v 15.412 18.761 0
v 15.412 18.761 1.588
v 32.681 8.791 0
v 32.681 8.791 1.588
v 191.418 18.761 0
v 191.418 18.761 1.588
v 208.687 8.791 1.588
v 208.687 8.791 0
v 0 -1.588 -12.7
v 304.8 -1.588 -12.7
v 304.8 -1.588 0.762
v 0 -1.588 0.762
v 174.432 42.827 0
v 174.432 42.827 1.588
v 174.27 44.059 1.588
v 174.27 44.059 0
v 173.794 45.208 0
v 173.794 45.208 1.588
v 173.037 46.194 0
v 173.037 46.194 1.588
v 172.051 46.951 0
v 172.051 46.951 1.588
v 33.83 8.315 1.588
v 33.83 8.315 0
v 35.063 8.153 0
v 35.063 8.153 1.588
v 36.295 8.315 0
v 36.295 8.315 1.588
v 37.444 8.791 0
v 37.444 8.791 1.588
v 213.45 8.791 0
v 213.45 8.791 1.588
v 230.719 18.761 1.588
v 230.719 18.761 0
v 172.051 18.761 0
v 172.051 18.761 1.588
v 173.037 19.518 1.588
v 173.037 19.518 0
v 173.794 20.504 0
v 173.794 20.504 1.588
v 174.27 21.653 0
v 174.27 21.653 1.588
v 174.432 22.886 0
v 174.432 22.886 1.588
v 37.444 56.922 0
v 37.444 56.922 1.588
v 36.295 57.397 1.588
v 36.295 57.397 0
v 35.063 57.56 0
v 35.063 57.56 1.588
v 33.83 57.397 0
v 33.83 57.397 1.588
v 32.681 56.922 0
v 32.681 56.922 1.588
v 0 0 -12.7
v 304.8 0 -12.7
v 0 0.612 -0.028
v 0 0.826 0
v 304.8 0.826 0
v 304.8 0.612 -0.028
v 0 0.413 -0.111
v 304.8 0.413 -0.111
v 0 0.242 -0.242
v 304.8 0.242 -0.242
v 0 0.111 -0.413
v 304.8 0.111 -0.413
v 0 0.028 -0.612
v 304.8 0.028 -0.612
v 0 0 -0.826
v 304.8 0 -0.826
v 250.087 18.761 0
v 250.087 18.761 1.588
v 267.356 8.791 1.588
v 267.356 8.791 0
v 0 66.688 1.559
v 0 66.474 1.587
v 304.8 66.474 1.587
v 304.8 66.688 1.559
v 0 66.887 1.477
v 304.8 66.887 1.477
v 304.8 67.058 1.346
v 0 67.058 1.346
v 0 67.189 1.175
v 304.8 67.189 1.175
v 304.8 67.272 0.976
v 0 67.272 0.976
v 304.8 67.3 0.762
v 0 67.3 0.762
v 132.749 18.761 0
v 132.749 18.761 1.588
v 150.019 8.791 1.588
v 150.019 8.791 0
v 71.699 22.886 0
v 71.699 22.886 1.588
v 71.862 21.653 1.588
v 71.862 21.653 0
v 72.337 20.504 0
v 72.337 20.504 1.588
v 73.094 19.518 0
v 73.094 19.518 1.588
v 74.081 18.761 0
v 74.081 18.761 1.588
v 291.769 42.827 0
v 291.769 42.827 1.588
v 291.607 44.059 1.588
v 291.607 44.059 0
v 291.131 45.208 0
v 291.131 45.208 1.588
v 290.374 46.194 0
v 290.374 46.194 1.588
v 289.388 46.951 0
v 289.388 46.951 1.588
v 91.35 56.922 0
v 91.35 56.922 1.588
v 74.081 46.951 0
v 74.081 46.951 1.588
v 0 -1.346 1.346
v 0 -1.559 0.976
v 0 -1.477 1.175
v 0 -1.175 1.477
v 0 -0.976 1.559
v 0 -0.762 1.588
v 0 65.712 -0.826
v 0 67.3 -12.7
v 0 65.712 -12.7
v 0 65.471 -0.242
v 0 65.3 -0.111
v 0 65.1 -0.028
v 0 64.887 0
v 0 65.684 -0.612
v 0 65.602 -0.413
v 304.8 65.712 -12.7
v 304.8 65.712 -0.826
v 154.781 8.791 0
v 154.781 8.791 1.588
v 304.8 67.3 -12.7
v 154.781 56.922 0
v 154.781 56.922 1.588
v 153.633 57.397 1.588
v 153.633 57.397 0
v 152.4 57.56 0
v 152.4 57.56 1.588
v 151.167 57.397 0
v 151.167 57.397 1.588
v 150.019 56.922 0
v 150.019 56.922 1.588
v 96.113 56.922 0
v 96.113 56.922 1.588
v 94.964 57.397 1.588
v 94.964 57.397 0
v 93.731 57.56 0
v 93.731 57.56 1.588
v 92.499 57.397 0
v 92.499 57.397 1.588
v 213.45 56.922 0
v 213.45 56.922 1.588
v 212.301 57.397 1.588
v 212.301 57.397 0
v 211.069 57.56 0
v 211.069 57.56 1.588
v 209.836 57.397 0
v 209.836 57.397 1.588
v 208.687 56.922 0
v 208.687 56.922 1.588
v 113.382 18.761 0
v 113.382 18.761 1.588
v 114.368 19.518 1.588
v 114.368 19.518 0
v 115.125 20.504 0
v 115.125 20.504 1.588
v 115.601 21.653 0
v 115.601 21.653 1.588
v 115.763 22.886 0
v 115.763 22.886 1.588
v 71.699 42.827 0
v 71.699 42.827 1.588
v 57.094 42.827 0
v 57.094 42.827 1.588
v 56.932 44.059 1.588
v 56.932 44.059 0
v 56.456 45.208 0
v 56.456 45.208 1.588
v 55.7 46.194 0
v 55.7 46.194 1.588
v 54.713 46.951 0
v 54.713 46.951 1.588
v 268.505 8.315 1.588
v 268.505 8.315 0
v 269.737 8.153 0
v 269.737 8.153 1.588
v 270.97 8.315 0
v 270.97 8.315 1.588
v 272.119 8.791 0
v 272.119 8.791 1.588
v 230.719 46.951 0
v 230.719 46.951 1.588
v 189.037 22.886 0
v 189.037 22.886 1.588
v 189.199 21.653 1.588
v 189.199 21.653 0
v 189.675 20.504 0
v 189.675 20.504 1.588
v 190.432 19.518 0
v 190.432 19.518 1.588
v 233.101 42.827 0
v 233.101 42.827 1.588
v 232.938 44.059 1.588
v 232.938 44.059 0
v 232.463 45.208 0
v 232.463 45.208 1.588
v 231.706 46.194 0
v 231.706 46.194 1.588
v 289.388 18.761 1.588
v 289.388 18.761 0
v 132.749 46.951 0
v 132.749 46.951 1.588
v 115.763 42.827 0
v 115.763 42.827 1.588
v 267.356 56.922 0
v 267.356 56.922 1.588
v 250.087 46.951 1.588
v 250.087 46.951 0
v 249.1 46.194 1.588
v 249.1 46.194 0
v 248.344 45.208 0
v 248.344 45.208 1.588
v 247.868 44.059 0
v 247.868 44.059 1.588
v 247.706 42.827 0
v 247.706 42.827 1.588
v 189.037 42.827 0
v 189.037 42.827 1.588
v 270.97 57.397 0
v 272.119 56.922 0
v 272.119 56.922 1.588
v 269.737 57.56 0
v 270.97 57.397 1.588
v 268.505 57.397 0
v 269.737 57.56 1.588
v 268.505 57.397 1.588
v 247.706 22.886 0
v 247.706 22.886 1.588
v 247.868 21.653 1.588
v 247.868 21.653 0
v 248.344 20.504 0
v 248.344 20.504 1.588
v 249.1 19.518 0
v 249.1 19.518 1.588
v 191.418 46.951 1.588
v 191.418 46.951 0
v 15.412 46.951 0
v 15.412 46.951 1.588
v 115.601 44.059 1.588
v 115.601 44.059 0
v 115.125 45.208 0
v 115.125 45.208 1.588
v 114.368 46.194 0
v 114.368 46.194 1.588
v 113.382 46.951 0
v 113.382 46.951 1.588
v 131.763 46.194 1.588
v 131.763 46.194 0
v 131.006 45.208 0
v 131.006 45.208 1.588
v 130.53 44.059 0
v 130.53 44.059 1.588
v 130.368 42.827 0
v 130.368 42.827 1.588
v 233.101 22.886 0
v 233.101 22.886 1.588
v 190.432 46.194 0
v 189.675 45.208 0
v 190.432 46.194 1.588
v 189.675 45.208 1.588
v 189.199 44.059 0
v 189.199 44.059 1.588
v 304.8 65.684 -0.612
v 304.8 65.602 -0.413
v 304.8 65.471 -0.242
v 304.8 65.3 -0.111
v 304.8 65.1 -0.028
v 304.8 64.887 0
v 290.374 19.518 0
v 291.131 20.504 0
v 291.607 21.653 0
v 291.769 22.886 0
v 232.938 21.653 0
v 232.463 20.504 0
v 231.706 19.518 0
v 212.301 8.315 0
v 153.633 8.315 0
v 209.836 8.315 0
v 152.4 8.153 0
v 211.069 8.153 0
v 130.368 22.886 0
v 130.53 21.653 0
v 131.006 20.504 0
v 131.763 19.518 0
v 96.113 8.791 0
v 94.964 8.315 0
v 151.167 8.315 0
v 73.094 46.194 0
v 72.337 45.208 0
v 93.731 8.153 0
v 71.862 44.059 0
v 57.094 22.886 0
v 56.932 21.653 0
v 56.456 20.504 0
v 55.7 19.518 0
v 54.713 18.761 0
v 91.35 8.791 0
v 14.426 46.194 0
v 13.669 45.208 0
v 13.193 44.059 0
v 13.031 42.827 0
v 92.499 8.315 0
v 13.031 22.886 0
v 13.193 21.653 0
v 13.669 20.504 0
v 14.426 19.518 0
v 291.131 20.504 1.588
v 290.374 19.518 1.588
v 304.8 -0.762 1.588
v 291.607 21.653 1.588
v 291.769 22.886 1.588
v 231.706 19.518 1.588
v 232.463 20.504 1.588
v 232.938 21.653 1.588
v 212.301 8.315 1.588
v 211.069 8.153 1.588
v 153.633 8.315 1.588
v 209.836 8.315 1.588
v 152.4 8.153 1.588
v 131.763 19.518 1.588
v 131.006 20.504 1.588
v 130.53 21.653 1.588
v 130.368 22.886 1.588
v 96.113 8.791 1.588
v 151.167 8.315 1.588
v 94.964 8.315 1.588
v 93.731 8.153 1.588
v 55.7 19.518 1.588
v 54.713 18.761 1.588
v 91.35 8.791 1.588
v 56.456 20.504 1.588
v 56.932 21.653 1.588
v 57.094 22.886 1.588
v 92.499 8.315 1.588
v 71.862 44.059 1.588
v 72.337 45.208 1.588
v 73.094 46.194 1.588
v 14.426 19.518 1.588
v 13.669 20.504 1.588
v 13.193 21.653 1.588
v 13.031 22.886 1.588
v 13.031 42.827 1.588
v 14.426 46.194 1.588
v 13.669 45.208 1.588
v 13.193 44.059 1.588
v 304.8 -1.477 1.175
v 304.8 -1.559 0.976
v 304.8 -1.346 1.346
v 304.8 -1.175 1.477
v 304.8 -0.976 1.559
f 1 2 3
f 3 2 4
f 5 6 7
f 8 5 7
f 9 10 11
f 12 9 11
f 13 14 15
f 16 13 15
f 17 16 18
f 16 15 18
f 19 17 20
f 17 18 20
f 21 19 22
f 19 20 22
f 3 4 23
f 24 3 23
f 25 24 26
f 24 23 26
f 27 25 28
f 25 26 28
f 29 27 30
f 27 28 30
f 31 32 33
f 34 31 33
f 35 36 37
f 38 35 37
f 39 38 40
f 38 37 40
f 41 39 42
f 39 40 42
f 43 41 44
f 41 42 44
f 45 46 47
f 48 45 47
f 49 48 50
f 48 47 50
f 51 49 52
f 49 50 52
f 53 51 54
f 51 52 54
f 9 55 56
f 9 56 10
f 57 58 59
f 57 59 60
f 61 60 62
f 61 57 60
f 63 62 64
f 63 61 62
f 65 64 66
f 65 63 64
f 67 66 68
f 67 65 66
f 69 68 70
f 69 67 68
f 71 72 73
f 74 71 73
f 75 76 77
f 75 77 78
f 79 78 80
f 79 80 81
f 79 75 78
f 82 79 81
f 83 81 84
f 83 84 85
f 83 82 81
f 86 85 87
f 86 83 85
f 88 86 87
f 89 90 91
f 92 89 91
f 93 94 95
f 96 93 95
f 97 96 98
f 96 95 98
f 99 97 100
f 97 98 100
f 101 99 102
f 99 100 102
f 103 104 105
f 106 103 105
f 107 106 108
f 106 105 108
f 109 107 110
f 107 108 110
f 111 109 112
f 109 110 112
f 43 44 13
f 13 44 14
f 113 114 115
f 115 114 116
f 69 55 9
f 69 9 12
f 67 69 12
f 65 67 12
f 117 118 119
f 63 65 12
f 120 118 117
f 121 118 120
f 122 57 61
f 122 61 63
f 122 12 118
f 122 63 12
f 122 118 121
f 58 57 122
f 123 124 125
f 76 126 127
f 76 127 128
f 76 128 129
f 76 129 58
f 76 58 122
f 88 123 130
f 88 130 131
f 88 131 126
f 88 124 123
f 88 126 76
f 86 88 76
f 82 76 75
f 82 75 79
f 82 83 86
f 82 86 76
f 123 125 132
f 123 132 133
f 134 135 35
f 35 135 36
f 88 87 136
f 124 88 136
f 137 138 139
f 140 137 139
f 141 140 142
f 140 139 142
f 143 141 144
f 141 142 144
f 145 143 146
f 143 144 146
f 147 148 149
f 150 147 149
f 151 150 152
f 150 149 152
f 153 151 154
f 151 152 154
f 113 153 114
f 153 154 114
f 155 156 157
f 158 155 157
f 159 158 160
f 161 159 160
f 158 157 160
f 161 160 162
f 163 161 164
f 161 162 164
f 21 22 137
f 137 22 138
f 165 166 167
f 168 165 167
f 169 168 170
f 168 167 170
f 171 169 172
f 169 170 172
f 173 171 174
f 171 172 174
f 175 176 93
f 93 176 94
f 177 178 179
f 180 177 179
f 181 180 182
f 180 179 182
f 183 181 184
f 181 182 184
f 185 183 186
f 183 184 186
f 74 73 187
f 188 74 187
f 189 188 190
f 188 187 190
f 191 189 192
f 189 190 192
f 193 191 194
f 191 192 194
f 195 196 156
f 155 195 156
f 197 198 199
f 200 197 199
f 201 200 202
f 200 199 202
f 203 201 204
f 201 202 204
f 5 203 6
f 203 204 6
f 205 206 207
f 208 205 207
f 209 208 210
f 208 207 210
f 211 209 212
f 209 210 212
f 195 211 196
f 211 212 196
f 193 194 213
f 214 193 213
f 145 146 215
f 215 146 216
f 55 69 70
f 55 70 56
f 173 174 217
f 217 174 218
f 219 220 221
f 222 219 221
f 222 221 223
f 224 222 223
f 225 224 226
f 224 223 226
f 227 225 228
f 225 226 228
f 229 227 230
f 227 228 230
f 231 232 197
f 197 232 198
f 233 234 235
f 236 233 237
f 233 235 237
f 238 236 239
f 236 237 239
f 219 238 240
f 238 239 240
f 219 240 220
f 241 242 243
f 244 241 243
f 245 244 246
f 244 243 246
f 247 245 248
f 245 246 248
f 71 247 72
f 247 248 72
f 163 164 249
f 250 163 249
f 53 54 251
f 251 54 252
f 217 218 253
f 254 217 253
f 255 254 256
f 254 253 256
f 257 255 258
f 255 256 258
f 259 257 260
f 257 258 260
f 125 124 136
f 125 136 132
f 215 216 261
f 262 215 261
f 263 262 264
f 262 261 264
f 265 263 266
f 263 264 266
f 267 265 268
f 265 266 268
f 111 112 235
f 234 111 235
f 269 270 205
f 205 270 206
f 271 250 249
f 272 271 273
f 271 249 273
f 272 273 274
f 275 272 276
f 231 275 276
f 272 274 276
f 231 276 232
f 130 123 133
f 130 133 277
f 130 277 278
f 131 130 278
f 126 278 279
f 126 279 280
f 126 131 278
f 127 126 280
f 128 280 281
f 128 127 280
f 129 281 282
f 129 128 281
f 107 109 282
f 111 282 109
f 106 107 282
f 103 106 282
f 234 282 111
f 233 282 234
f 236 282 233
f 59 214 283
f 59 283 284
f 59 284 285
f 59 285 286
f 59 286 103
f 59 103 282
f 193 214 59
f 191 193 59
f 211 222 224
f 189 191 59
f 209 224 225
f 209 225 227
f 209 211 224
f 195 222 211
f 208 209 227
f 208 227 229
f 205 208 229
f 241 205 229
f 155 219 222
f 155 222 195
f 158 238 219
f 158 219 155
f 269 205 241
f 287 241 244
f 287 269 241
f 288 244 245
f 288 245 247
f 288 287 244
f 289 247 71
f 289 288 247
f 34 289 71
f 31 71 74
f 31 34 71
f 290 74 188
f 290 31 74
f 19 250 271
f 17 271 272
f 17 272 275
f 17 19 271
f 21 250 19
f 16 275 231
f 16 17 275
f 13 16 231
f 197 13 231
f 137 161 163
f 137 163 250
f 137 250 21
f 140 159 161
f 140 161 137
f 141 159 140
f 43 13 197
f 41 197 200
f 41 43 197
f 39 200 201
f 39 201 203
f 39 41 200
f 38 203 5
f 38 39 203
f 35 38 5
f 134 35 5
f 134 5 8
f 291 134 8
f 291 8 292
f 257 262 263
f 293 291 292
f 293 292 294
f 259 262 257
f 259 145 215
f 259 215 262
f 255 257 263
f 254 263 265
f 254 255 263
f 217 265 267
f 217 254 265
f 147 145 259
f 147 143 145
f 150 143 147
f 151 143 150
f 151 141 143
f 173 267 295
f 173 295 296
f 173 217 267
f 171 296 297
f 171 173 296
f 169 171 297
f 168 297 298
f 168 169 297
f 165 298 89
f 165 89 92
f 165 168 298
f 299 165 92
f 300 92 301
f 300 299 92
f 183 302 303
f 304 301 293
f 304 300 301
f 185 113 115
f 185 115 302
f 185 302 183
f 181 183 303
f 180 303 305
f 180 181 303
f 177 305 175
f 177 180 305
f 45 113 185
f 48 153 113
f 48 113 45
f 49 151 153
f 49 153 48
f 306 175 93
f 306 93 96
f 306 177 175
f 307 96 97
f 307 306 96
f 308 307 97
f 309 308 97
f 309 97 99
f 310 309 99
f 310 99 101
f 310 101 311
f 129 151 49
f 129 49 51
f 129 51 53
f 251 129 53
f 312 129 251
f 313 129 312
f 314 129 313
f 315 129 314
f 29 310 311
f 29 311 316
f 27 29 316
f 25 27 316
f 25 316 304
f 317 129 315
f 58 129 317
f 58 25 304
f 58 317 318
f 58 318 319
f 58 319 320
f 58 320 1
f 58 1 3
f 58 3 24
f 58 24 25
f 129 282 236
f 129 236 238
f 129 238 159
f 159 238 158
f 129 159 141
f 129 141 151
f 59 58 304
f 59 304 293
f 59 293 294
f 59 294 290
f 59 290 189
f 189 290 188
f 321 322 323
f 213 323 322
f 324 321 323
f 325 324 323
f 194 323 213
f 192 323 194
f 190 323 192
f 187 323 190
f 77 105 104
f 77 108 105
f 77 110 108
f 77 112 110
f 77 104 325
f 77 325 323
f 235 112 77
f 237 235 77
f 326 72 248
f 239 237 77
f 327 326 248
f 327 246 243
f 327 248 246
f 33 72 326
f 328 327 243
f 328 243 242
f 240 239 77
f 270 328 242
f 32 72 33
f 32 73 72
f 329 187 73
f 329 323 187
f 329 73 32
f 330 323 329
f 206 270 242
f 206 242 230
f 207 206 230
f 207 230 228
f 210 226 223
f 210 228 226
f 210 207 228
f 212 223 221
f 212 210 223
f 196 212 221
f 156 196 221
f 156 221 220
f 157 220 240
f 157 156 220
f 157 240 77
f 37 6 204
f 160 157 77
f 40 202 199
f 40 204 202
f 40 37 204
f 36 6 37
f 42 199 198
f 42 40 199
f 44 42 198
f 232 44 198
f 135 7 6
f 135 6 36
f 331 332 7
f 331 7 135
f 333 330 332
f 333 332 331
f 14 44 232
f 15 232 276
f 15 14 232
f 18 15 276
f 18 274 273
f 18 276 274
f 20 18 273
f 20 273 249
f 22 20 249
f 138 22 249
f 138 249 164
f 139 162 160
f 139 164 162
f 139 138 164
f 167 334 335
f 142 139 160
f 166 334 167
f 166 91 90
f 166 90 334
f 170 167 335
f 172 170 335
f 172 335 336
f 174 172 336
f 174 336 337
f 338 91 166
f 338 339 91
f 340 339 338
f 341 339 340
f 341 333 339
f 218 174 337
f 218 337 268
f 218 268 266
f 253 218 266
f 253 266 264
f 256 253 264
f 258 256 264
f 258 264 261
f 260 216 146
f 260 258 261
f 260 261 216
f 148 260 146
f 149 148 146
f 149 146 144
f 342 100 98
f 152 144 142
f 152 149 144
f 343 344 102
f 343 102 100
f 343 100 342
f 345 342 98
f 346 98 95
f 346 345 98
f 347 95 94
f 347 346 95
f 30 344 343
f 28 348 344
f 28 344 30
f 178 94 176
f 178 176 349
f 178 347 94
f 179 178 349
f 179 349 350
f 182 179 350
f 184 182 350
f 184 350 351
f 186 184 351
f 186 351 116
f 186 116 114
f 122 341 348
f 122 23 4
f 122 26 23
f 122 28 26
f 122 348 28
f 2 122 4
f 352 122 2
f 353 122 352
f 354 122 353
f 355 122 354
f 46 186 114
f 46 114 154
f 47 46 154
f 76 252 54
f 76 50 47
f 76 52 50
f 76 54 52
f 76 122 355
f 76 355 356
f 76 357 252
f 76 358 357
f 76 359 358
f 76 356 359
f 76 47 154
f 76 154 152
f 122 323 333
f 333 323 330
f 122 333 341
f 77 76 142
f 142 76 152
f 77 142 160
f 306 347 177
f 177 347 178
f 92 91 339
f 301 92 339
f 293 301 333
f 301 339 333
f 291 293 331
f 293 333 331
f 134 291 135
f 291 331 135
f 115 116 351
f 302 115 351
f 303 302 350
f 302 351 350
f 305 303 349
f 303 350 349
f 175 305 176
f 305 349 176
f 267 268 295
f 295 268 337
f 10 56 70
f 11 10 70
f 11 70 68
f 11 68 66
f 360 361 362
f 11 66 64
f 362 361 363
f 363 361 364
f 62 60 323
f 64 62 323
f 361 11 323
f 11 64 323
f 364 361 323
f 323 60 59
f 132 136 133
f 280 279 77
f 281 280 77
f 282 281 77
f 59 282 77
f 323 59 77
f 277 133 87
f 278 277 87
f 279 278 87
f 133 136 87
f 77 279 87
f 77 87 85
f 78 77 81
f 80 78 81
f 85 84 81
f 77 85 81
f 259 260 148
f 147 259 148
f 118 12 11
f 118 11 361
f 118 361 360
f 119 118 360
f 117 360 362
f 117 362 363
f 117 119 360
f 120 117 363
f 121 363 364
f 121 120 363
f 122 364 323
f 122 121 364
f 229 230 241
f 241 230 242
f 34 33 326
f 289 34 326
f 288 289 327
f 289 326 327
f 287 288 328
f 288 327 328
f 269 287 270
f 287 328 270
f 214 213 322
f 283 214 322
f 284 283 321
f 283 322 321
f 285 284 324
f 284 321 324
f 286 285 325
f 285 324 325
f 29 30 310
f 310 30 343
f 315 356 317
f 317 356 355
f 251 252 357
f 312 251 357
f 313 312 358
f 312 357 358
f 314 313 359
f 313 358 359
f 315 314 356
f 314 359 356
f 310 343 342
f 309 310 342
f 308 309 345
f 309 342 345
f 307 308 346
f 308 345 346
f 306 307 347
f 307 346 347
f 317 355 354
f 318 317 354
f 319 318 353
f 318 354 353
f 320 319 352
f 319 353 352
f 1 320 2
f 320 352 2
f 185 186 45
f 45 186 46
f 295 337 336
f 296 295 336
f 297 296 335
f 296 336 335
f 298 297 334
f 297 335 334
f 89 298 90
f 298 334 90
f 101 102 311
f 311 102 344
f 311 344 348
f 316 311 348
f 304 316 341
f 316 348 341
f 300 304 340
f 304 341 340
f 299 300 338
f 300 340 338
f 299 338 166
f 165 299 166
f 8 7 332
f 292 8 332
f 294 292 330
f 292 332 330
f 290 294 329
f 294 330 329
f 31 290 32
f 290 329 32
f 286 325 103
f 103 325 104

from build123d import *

# Parameters (mm, degrees)
BOSS_EXTRUDE1_DEPTH = 304.8
CUT_EXTRUDE1_REACH  = 16.288


with BuildPart() as part:
    # Sketch1 → Boss-Extrude1 (new body)
    with BuildSketch(Plane(origin=(0, 0, 0), x_dir=(0, 0, -1), z_dir=(1, 0, 0))):
        with BuildLine():
            Line((-0.762, 67.29984), (12.7, 67.29984))
            Line((12.7, 67.29984), (12.7, 65.71234))
            Line((12.7, 65.71234), (0.8255, 65.71234))
            ThreePointArc((0.8255, 65.71234), (0.241783352, 65.470556648), (0, 64.88684))
            Line((0, 64.88684), (0, 0.8255))
            ThreePointArc((0, 0.8255), (0.241783352, 0.241783352), (0.8255, 0))
            Line((0.8255, 0), (12.7, 0))
            Line((12.7, 0), (12.7, -1.5875))
            Line((12.7, -1.5875), (-0.762, -1.5875))
            ThreePointArc((-0.762, -1.5875), (-1.345716648, -1.345716648), (-1.5875, -0.762))
            Line((-1.5875, -0.762), (-1.5875, 66.47434))
            ThreePointArc((-1.5875, 66.47434), (-1.345716648, 67.058056648), (-0.762, 67.29984))
        make_face()
    extrude(amount=BOSS_EXTRUDE1_DEPTH)

    # Sketch2 → Cut-Extrude1 (cut, up to next)
    with BuildSketch(Plane.XY.offset(1.5875), mode=Mode.PRIVATE) as cut_extrude1_sk1:
        with BuildLine():
            Line((32.681340962, 56.921546337), (15.411988703, 46.951081161))
            ThreePointArc((15.411988703, 46.951081161), (13.668792717, 45.207885176), (13.030738703, 42.826635176))
            Line((13.030738703, 42.826635176), (13.030738703, 22.885704824))
            ThreePointArc((13.030738703, 22.885704824), (13.668792717, 20.504454824), (15.411988703, 18.761258839))
            Line((15.411988703, 18.761258839), (32.681340962, 8.790793663))
            ThreePointArc((32.681340962, 8.790793663), (35.062590962, 8.152739649), (37.443840962, 8.790793663))
            Line((37.443840962, 8.790793663), (54.713193222, 18.761258839))
            ThreePointArc((54.713193222, 18.761258839), (56.456389207, 20.504454824), (57.094443222, 22.885704824))
            Line((57.094443222, 22.885704824), (57.094443222, 42.826635176))
            ThreePointArc((57.094443222, 42.826635176), (56.456389207, 45.207885176), (54.713193222, 46.951081161))
            Line((54.713193222, 46.951081161), (37.443840962, 56.921546337))
            ThreePointArc((37.443840962, 56.921546337), (35.062590962, 57.559600351), (32.681340962, 56.921546337))
        make_face()
    cut_extrude1_tool1 = extrude(cut_extrude1_sk1.sketch, amount=-CUT_EXTRUDE1_REACH, mode=Mode.PRIVATE) & part.part
    add(cut_extrude1_tool1.solids().sort_by_distance((35.062591, 32.85617, 1.5875))[0], mode=Mode.SUBTRACT)
    # Sketch2 → Cut-Extrude1 (cut, up to next)
    with BuildSketch(Plane.XY.offset(1.5875), mode=Mode.PRIVATE) as cut_extrude1_sk2:
        with BuildLine():
            Line((91.350045481, 56.921546337), (74.080693222, 46.951081161))
            ThreePointArc((74.080693222, 46.951081161), (72.337497236, 45.207885176), (71.699443222, 42.826635176))
            Line((71.699443222, 42.826635176), (71.699443222, 22.885704824))
            ThreePointArc((71.699443222, 22.885704824), (72.337497236, 20.504454824), (74.080693222, 18.761258839))
            Line((74.080693222, 18.761258839), (91.350045481, 8.790793663))
            ThreePointArc((91.350045481, 8.790793663), (93.731295481, 8.152739649), (96.112545481, 8.790793663))
            Line((96.112545481, 8.790793663), (113.381897741, 18.761258839))
            ThreePointArc((113.381897741, 18.761258839), (115.125093726, 20.504454824), (115.763147741, 22.885704824))
            Line((115.763147741, 22.885704824), (115.763147741, 42.826635176))
            ThreePointArc((115.763147741, 42.826635176), (115.125093726, 45.207885176), (113.381897741, 46.951081161))
            Line((113.381897741, 46.951081161), (96.112545481, 56.921546337))
            ThreePointArc((96.112545481, 56.921546337), (93.731295481, 57.559600351), (91.350045481, 56.921546337))
        make_face()
    cut_extrude1_tool2 = extrude(cut_extrude1_sk2.sketch, amount=-CUT_EXTRUDE1_REACH, mode=Mode.PRIVATE) & part.part
    add(cut_extrude1_tool2.solids().sort_by_distance((93.731295, 32.85617, 1.5875))[0], mode=Mode.SUBTRACT)
    # Sketch2 → Cut-Extrude1 (cut, up to next)
    with BuildSketch(Plane.XY.offset(1.5875), mode=Mode.PRIVATE) as cut_extrude1_sk3:
        with BuildLine():
            Line((150.01875, 56.921546337), (132.749397741, 46.951081161))
            ThreePointArc((132.749397741, 46.951081161), (131.006201755, 45.207885176), (130.368147741, 42.826635176))
            Line((130.368147741, 42.826635176), (130.368147741, 22.885704824))
            ThreePointArc((130.368147741, 22.885704824), (131.006201755, 20.504454824), (132.749397741, 18.761258839))
            Line((132.749397741, 18.761258839), (150.01875, 8.790793663))
            ThreePointArc((150.01875, 8.790793663), (152.4, 8.152739649), (154.78125, 8.790793663))
            Line((154.78125, 8.790793663), (172.050602259, 18.761258839))
            ThreePointArc((172.050602259, 18.761258839), (173.793798245, 20.504454824), (174.431852259, 22.885704824))
            Line((174.431852259, 22.885704824), (174.431852259, 42.826635176))
            ThreePointArc((174.431852259, 42.826635176), (173.793798245, 45.207885176), (172.050602259, 46.951081161))
            Line((172.050602259, 46.951081161), (154.78125, 56.921546337))
            ThreePointArc((154.78125, 56.921546337), (152.4, 57.559600351), (150.01875, 56.921546337))
        make_face()
    cut_extrude1_tool3 = extrude(cut_extrude1_sk3.sketch, amount=-CUT_EXTRUDE1_REACH, mode=Mode.PRIVATE) & part.part
    add(cut_extrude1_tool3.solids().sort_by_distance((152.4, 32.85617, 1.5875))[0], mode=Mode.SUBTRACT)
    # Sketch2 → Cut-Extrude1 (cut, up to next)
    with BuildSketch(Plane.XY.offset(1.5875), mode=Mode.PRIVATE) as cut_extrude1_sk4:
        with BuildLine():
            Line((208.687454519, 56.921546337), (191.418102259, 46.951081161))
            ThreePointArc((191.418102259, 46.951081161), (189.674906274, 45.207885176), (189.036852259, 42.826635176))
            Line((189.036852259, 42.826635176), (189.036852259, 22.885704824))
            ThreePointArc((189.036852259, 22.885704824), (189.674906274, 20.504454824), (191.418102259, 18.761258839))
            Line((191.418102259, 18.761258839), (208.687454519, 8.790793663))
            ThreePointArc((208.687454519, 8.790793663), (211.068704519, 8.152739649), (213.449954519, 8.790793663))
            Line((213.449954519, 8.790793663), (230.719306778, 18.761258839))
            ThreePointArc((230.719306778, 18.761258839), (232.462502764, 20.504454824), (233.100556778, 22.885704824))
            Line((233.100556778, 22.885704824), (233.100556778, 42.826635176))
            ThreePointArc((233.100556778, 42.826635176), (232.462502764, 45.207885176), (230.719306778, 46.951081161))
            Line((230.719306778, 46.951081161), (213.449954519, 56.921546337))
            ThreePointArc((213.449954519, 56.921546337), (211.068704519, 57.559600351), (208.687454519, 56.921546337))
        make_face()
    cut_extrude1_tool4 = extrude(cut_extrude1_sk4.sketch, amount=-CUT_EXTRUDE1_REACH, mode=Mode.PRIVATE) & part.part
    add(cut_extrude1_tool4.solids().sort_by_distance((211.068705, 32.85617, 1.5875))[0], mode=Mode.SUBTRACT)
    # Sketch2 → Cut-Extrude1 (cut, up to next)
    with BuildSketch(Plane.XY.offset(1.5875), mode=Mode.PRIVATE) as cut_extrude1_sk5:
        with BuildLine():
            Line((267.356159038, 56.921546337), (250.086806778, 46.951081161))
            ThreePointArc((250.086806778, 46.951081161), (248.343610793, 45.207885176), (247.705556778, 42.826635176))
            Line((247.705556778, 42.826635176), (247.705556778, 22.885704824))
            ThreePointArc((247.705556778, 22.885704824), (248.343610793, 20.504454824), (250.086806778, 18.761258839))
            Line((250.086806778, 18.761258839), (267.356159038, 8.790793663))
            ThreePointArc((267.356159038, 8.790793663), (269.737409038, 8.152739649), (272.118659038, 8.790793663))
            Line((272.118659038, 8.790793663), (289.388011297, 18.761258839))
            ThreePointArc((289.388011297, 18.761258839), (291.131207283, 20.504454824), (291.769261297, 22.885704824))
            Line((291.769261297, 22.885704824), (291.769261297, 42.826635176))
            ThreePointArc((291.769261297, 42.826635176), (291.131207283, 45.207885176), (289.388011297, 46.951081161))
            Line((289.388011297, 46.951081161), (272.118659038, 56.921546337))
            ThreePointArc((272.118659038, 56.921546337), (269.737409038, 57.559600351), (267.356159038, 56.921546337))
        make_face()
    cut_extrude1_tool5 = extrude(cut_extrude1_sk5.sketch, amount=-CUT_EXTRUDE1_REACH, mode=Mode.PRIVATE) & part.part
    add(cut_extrude1_tool5.solids().sort_by_distance((269.737409, 32.85617, 1.5875))[0], mode=Mode.SUBTRACT)


solid = part.part
